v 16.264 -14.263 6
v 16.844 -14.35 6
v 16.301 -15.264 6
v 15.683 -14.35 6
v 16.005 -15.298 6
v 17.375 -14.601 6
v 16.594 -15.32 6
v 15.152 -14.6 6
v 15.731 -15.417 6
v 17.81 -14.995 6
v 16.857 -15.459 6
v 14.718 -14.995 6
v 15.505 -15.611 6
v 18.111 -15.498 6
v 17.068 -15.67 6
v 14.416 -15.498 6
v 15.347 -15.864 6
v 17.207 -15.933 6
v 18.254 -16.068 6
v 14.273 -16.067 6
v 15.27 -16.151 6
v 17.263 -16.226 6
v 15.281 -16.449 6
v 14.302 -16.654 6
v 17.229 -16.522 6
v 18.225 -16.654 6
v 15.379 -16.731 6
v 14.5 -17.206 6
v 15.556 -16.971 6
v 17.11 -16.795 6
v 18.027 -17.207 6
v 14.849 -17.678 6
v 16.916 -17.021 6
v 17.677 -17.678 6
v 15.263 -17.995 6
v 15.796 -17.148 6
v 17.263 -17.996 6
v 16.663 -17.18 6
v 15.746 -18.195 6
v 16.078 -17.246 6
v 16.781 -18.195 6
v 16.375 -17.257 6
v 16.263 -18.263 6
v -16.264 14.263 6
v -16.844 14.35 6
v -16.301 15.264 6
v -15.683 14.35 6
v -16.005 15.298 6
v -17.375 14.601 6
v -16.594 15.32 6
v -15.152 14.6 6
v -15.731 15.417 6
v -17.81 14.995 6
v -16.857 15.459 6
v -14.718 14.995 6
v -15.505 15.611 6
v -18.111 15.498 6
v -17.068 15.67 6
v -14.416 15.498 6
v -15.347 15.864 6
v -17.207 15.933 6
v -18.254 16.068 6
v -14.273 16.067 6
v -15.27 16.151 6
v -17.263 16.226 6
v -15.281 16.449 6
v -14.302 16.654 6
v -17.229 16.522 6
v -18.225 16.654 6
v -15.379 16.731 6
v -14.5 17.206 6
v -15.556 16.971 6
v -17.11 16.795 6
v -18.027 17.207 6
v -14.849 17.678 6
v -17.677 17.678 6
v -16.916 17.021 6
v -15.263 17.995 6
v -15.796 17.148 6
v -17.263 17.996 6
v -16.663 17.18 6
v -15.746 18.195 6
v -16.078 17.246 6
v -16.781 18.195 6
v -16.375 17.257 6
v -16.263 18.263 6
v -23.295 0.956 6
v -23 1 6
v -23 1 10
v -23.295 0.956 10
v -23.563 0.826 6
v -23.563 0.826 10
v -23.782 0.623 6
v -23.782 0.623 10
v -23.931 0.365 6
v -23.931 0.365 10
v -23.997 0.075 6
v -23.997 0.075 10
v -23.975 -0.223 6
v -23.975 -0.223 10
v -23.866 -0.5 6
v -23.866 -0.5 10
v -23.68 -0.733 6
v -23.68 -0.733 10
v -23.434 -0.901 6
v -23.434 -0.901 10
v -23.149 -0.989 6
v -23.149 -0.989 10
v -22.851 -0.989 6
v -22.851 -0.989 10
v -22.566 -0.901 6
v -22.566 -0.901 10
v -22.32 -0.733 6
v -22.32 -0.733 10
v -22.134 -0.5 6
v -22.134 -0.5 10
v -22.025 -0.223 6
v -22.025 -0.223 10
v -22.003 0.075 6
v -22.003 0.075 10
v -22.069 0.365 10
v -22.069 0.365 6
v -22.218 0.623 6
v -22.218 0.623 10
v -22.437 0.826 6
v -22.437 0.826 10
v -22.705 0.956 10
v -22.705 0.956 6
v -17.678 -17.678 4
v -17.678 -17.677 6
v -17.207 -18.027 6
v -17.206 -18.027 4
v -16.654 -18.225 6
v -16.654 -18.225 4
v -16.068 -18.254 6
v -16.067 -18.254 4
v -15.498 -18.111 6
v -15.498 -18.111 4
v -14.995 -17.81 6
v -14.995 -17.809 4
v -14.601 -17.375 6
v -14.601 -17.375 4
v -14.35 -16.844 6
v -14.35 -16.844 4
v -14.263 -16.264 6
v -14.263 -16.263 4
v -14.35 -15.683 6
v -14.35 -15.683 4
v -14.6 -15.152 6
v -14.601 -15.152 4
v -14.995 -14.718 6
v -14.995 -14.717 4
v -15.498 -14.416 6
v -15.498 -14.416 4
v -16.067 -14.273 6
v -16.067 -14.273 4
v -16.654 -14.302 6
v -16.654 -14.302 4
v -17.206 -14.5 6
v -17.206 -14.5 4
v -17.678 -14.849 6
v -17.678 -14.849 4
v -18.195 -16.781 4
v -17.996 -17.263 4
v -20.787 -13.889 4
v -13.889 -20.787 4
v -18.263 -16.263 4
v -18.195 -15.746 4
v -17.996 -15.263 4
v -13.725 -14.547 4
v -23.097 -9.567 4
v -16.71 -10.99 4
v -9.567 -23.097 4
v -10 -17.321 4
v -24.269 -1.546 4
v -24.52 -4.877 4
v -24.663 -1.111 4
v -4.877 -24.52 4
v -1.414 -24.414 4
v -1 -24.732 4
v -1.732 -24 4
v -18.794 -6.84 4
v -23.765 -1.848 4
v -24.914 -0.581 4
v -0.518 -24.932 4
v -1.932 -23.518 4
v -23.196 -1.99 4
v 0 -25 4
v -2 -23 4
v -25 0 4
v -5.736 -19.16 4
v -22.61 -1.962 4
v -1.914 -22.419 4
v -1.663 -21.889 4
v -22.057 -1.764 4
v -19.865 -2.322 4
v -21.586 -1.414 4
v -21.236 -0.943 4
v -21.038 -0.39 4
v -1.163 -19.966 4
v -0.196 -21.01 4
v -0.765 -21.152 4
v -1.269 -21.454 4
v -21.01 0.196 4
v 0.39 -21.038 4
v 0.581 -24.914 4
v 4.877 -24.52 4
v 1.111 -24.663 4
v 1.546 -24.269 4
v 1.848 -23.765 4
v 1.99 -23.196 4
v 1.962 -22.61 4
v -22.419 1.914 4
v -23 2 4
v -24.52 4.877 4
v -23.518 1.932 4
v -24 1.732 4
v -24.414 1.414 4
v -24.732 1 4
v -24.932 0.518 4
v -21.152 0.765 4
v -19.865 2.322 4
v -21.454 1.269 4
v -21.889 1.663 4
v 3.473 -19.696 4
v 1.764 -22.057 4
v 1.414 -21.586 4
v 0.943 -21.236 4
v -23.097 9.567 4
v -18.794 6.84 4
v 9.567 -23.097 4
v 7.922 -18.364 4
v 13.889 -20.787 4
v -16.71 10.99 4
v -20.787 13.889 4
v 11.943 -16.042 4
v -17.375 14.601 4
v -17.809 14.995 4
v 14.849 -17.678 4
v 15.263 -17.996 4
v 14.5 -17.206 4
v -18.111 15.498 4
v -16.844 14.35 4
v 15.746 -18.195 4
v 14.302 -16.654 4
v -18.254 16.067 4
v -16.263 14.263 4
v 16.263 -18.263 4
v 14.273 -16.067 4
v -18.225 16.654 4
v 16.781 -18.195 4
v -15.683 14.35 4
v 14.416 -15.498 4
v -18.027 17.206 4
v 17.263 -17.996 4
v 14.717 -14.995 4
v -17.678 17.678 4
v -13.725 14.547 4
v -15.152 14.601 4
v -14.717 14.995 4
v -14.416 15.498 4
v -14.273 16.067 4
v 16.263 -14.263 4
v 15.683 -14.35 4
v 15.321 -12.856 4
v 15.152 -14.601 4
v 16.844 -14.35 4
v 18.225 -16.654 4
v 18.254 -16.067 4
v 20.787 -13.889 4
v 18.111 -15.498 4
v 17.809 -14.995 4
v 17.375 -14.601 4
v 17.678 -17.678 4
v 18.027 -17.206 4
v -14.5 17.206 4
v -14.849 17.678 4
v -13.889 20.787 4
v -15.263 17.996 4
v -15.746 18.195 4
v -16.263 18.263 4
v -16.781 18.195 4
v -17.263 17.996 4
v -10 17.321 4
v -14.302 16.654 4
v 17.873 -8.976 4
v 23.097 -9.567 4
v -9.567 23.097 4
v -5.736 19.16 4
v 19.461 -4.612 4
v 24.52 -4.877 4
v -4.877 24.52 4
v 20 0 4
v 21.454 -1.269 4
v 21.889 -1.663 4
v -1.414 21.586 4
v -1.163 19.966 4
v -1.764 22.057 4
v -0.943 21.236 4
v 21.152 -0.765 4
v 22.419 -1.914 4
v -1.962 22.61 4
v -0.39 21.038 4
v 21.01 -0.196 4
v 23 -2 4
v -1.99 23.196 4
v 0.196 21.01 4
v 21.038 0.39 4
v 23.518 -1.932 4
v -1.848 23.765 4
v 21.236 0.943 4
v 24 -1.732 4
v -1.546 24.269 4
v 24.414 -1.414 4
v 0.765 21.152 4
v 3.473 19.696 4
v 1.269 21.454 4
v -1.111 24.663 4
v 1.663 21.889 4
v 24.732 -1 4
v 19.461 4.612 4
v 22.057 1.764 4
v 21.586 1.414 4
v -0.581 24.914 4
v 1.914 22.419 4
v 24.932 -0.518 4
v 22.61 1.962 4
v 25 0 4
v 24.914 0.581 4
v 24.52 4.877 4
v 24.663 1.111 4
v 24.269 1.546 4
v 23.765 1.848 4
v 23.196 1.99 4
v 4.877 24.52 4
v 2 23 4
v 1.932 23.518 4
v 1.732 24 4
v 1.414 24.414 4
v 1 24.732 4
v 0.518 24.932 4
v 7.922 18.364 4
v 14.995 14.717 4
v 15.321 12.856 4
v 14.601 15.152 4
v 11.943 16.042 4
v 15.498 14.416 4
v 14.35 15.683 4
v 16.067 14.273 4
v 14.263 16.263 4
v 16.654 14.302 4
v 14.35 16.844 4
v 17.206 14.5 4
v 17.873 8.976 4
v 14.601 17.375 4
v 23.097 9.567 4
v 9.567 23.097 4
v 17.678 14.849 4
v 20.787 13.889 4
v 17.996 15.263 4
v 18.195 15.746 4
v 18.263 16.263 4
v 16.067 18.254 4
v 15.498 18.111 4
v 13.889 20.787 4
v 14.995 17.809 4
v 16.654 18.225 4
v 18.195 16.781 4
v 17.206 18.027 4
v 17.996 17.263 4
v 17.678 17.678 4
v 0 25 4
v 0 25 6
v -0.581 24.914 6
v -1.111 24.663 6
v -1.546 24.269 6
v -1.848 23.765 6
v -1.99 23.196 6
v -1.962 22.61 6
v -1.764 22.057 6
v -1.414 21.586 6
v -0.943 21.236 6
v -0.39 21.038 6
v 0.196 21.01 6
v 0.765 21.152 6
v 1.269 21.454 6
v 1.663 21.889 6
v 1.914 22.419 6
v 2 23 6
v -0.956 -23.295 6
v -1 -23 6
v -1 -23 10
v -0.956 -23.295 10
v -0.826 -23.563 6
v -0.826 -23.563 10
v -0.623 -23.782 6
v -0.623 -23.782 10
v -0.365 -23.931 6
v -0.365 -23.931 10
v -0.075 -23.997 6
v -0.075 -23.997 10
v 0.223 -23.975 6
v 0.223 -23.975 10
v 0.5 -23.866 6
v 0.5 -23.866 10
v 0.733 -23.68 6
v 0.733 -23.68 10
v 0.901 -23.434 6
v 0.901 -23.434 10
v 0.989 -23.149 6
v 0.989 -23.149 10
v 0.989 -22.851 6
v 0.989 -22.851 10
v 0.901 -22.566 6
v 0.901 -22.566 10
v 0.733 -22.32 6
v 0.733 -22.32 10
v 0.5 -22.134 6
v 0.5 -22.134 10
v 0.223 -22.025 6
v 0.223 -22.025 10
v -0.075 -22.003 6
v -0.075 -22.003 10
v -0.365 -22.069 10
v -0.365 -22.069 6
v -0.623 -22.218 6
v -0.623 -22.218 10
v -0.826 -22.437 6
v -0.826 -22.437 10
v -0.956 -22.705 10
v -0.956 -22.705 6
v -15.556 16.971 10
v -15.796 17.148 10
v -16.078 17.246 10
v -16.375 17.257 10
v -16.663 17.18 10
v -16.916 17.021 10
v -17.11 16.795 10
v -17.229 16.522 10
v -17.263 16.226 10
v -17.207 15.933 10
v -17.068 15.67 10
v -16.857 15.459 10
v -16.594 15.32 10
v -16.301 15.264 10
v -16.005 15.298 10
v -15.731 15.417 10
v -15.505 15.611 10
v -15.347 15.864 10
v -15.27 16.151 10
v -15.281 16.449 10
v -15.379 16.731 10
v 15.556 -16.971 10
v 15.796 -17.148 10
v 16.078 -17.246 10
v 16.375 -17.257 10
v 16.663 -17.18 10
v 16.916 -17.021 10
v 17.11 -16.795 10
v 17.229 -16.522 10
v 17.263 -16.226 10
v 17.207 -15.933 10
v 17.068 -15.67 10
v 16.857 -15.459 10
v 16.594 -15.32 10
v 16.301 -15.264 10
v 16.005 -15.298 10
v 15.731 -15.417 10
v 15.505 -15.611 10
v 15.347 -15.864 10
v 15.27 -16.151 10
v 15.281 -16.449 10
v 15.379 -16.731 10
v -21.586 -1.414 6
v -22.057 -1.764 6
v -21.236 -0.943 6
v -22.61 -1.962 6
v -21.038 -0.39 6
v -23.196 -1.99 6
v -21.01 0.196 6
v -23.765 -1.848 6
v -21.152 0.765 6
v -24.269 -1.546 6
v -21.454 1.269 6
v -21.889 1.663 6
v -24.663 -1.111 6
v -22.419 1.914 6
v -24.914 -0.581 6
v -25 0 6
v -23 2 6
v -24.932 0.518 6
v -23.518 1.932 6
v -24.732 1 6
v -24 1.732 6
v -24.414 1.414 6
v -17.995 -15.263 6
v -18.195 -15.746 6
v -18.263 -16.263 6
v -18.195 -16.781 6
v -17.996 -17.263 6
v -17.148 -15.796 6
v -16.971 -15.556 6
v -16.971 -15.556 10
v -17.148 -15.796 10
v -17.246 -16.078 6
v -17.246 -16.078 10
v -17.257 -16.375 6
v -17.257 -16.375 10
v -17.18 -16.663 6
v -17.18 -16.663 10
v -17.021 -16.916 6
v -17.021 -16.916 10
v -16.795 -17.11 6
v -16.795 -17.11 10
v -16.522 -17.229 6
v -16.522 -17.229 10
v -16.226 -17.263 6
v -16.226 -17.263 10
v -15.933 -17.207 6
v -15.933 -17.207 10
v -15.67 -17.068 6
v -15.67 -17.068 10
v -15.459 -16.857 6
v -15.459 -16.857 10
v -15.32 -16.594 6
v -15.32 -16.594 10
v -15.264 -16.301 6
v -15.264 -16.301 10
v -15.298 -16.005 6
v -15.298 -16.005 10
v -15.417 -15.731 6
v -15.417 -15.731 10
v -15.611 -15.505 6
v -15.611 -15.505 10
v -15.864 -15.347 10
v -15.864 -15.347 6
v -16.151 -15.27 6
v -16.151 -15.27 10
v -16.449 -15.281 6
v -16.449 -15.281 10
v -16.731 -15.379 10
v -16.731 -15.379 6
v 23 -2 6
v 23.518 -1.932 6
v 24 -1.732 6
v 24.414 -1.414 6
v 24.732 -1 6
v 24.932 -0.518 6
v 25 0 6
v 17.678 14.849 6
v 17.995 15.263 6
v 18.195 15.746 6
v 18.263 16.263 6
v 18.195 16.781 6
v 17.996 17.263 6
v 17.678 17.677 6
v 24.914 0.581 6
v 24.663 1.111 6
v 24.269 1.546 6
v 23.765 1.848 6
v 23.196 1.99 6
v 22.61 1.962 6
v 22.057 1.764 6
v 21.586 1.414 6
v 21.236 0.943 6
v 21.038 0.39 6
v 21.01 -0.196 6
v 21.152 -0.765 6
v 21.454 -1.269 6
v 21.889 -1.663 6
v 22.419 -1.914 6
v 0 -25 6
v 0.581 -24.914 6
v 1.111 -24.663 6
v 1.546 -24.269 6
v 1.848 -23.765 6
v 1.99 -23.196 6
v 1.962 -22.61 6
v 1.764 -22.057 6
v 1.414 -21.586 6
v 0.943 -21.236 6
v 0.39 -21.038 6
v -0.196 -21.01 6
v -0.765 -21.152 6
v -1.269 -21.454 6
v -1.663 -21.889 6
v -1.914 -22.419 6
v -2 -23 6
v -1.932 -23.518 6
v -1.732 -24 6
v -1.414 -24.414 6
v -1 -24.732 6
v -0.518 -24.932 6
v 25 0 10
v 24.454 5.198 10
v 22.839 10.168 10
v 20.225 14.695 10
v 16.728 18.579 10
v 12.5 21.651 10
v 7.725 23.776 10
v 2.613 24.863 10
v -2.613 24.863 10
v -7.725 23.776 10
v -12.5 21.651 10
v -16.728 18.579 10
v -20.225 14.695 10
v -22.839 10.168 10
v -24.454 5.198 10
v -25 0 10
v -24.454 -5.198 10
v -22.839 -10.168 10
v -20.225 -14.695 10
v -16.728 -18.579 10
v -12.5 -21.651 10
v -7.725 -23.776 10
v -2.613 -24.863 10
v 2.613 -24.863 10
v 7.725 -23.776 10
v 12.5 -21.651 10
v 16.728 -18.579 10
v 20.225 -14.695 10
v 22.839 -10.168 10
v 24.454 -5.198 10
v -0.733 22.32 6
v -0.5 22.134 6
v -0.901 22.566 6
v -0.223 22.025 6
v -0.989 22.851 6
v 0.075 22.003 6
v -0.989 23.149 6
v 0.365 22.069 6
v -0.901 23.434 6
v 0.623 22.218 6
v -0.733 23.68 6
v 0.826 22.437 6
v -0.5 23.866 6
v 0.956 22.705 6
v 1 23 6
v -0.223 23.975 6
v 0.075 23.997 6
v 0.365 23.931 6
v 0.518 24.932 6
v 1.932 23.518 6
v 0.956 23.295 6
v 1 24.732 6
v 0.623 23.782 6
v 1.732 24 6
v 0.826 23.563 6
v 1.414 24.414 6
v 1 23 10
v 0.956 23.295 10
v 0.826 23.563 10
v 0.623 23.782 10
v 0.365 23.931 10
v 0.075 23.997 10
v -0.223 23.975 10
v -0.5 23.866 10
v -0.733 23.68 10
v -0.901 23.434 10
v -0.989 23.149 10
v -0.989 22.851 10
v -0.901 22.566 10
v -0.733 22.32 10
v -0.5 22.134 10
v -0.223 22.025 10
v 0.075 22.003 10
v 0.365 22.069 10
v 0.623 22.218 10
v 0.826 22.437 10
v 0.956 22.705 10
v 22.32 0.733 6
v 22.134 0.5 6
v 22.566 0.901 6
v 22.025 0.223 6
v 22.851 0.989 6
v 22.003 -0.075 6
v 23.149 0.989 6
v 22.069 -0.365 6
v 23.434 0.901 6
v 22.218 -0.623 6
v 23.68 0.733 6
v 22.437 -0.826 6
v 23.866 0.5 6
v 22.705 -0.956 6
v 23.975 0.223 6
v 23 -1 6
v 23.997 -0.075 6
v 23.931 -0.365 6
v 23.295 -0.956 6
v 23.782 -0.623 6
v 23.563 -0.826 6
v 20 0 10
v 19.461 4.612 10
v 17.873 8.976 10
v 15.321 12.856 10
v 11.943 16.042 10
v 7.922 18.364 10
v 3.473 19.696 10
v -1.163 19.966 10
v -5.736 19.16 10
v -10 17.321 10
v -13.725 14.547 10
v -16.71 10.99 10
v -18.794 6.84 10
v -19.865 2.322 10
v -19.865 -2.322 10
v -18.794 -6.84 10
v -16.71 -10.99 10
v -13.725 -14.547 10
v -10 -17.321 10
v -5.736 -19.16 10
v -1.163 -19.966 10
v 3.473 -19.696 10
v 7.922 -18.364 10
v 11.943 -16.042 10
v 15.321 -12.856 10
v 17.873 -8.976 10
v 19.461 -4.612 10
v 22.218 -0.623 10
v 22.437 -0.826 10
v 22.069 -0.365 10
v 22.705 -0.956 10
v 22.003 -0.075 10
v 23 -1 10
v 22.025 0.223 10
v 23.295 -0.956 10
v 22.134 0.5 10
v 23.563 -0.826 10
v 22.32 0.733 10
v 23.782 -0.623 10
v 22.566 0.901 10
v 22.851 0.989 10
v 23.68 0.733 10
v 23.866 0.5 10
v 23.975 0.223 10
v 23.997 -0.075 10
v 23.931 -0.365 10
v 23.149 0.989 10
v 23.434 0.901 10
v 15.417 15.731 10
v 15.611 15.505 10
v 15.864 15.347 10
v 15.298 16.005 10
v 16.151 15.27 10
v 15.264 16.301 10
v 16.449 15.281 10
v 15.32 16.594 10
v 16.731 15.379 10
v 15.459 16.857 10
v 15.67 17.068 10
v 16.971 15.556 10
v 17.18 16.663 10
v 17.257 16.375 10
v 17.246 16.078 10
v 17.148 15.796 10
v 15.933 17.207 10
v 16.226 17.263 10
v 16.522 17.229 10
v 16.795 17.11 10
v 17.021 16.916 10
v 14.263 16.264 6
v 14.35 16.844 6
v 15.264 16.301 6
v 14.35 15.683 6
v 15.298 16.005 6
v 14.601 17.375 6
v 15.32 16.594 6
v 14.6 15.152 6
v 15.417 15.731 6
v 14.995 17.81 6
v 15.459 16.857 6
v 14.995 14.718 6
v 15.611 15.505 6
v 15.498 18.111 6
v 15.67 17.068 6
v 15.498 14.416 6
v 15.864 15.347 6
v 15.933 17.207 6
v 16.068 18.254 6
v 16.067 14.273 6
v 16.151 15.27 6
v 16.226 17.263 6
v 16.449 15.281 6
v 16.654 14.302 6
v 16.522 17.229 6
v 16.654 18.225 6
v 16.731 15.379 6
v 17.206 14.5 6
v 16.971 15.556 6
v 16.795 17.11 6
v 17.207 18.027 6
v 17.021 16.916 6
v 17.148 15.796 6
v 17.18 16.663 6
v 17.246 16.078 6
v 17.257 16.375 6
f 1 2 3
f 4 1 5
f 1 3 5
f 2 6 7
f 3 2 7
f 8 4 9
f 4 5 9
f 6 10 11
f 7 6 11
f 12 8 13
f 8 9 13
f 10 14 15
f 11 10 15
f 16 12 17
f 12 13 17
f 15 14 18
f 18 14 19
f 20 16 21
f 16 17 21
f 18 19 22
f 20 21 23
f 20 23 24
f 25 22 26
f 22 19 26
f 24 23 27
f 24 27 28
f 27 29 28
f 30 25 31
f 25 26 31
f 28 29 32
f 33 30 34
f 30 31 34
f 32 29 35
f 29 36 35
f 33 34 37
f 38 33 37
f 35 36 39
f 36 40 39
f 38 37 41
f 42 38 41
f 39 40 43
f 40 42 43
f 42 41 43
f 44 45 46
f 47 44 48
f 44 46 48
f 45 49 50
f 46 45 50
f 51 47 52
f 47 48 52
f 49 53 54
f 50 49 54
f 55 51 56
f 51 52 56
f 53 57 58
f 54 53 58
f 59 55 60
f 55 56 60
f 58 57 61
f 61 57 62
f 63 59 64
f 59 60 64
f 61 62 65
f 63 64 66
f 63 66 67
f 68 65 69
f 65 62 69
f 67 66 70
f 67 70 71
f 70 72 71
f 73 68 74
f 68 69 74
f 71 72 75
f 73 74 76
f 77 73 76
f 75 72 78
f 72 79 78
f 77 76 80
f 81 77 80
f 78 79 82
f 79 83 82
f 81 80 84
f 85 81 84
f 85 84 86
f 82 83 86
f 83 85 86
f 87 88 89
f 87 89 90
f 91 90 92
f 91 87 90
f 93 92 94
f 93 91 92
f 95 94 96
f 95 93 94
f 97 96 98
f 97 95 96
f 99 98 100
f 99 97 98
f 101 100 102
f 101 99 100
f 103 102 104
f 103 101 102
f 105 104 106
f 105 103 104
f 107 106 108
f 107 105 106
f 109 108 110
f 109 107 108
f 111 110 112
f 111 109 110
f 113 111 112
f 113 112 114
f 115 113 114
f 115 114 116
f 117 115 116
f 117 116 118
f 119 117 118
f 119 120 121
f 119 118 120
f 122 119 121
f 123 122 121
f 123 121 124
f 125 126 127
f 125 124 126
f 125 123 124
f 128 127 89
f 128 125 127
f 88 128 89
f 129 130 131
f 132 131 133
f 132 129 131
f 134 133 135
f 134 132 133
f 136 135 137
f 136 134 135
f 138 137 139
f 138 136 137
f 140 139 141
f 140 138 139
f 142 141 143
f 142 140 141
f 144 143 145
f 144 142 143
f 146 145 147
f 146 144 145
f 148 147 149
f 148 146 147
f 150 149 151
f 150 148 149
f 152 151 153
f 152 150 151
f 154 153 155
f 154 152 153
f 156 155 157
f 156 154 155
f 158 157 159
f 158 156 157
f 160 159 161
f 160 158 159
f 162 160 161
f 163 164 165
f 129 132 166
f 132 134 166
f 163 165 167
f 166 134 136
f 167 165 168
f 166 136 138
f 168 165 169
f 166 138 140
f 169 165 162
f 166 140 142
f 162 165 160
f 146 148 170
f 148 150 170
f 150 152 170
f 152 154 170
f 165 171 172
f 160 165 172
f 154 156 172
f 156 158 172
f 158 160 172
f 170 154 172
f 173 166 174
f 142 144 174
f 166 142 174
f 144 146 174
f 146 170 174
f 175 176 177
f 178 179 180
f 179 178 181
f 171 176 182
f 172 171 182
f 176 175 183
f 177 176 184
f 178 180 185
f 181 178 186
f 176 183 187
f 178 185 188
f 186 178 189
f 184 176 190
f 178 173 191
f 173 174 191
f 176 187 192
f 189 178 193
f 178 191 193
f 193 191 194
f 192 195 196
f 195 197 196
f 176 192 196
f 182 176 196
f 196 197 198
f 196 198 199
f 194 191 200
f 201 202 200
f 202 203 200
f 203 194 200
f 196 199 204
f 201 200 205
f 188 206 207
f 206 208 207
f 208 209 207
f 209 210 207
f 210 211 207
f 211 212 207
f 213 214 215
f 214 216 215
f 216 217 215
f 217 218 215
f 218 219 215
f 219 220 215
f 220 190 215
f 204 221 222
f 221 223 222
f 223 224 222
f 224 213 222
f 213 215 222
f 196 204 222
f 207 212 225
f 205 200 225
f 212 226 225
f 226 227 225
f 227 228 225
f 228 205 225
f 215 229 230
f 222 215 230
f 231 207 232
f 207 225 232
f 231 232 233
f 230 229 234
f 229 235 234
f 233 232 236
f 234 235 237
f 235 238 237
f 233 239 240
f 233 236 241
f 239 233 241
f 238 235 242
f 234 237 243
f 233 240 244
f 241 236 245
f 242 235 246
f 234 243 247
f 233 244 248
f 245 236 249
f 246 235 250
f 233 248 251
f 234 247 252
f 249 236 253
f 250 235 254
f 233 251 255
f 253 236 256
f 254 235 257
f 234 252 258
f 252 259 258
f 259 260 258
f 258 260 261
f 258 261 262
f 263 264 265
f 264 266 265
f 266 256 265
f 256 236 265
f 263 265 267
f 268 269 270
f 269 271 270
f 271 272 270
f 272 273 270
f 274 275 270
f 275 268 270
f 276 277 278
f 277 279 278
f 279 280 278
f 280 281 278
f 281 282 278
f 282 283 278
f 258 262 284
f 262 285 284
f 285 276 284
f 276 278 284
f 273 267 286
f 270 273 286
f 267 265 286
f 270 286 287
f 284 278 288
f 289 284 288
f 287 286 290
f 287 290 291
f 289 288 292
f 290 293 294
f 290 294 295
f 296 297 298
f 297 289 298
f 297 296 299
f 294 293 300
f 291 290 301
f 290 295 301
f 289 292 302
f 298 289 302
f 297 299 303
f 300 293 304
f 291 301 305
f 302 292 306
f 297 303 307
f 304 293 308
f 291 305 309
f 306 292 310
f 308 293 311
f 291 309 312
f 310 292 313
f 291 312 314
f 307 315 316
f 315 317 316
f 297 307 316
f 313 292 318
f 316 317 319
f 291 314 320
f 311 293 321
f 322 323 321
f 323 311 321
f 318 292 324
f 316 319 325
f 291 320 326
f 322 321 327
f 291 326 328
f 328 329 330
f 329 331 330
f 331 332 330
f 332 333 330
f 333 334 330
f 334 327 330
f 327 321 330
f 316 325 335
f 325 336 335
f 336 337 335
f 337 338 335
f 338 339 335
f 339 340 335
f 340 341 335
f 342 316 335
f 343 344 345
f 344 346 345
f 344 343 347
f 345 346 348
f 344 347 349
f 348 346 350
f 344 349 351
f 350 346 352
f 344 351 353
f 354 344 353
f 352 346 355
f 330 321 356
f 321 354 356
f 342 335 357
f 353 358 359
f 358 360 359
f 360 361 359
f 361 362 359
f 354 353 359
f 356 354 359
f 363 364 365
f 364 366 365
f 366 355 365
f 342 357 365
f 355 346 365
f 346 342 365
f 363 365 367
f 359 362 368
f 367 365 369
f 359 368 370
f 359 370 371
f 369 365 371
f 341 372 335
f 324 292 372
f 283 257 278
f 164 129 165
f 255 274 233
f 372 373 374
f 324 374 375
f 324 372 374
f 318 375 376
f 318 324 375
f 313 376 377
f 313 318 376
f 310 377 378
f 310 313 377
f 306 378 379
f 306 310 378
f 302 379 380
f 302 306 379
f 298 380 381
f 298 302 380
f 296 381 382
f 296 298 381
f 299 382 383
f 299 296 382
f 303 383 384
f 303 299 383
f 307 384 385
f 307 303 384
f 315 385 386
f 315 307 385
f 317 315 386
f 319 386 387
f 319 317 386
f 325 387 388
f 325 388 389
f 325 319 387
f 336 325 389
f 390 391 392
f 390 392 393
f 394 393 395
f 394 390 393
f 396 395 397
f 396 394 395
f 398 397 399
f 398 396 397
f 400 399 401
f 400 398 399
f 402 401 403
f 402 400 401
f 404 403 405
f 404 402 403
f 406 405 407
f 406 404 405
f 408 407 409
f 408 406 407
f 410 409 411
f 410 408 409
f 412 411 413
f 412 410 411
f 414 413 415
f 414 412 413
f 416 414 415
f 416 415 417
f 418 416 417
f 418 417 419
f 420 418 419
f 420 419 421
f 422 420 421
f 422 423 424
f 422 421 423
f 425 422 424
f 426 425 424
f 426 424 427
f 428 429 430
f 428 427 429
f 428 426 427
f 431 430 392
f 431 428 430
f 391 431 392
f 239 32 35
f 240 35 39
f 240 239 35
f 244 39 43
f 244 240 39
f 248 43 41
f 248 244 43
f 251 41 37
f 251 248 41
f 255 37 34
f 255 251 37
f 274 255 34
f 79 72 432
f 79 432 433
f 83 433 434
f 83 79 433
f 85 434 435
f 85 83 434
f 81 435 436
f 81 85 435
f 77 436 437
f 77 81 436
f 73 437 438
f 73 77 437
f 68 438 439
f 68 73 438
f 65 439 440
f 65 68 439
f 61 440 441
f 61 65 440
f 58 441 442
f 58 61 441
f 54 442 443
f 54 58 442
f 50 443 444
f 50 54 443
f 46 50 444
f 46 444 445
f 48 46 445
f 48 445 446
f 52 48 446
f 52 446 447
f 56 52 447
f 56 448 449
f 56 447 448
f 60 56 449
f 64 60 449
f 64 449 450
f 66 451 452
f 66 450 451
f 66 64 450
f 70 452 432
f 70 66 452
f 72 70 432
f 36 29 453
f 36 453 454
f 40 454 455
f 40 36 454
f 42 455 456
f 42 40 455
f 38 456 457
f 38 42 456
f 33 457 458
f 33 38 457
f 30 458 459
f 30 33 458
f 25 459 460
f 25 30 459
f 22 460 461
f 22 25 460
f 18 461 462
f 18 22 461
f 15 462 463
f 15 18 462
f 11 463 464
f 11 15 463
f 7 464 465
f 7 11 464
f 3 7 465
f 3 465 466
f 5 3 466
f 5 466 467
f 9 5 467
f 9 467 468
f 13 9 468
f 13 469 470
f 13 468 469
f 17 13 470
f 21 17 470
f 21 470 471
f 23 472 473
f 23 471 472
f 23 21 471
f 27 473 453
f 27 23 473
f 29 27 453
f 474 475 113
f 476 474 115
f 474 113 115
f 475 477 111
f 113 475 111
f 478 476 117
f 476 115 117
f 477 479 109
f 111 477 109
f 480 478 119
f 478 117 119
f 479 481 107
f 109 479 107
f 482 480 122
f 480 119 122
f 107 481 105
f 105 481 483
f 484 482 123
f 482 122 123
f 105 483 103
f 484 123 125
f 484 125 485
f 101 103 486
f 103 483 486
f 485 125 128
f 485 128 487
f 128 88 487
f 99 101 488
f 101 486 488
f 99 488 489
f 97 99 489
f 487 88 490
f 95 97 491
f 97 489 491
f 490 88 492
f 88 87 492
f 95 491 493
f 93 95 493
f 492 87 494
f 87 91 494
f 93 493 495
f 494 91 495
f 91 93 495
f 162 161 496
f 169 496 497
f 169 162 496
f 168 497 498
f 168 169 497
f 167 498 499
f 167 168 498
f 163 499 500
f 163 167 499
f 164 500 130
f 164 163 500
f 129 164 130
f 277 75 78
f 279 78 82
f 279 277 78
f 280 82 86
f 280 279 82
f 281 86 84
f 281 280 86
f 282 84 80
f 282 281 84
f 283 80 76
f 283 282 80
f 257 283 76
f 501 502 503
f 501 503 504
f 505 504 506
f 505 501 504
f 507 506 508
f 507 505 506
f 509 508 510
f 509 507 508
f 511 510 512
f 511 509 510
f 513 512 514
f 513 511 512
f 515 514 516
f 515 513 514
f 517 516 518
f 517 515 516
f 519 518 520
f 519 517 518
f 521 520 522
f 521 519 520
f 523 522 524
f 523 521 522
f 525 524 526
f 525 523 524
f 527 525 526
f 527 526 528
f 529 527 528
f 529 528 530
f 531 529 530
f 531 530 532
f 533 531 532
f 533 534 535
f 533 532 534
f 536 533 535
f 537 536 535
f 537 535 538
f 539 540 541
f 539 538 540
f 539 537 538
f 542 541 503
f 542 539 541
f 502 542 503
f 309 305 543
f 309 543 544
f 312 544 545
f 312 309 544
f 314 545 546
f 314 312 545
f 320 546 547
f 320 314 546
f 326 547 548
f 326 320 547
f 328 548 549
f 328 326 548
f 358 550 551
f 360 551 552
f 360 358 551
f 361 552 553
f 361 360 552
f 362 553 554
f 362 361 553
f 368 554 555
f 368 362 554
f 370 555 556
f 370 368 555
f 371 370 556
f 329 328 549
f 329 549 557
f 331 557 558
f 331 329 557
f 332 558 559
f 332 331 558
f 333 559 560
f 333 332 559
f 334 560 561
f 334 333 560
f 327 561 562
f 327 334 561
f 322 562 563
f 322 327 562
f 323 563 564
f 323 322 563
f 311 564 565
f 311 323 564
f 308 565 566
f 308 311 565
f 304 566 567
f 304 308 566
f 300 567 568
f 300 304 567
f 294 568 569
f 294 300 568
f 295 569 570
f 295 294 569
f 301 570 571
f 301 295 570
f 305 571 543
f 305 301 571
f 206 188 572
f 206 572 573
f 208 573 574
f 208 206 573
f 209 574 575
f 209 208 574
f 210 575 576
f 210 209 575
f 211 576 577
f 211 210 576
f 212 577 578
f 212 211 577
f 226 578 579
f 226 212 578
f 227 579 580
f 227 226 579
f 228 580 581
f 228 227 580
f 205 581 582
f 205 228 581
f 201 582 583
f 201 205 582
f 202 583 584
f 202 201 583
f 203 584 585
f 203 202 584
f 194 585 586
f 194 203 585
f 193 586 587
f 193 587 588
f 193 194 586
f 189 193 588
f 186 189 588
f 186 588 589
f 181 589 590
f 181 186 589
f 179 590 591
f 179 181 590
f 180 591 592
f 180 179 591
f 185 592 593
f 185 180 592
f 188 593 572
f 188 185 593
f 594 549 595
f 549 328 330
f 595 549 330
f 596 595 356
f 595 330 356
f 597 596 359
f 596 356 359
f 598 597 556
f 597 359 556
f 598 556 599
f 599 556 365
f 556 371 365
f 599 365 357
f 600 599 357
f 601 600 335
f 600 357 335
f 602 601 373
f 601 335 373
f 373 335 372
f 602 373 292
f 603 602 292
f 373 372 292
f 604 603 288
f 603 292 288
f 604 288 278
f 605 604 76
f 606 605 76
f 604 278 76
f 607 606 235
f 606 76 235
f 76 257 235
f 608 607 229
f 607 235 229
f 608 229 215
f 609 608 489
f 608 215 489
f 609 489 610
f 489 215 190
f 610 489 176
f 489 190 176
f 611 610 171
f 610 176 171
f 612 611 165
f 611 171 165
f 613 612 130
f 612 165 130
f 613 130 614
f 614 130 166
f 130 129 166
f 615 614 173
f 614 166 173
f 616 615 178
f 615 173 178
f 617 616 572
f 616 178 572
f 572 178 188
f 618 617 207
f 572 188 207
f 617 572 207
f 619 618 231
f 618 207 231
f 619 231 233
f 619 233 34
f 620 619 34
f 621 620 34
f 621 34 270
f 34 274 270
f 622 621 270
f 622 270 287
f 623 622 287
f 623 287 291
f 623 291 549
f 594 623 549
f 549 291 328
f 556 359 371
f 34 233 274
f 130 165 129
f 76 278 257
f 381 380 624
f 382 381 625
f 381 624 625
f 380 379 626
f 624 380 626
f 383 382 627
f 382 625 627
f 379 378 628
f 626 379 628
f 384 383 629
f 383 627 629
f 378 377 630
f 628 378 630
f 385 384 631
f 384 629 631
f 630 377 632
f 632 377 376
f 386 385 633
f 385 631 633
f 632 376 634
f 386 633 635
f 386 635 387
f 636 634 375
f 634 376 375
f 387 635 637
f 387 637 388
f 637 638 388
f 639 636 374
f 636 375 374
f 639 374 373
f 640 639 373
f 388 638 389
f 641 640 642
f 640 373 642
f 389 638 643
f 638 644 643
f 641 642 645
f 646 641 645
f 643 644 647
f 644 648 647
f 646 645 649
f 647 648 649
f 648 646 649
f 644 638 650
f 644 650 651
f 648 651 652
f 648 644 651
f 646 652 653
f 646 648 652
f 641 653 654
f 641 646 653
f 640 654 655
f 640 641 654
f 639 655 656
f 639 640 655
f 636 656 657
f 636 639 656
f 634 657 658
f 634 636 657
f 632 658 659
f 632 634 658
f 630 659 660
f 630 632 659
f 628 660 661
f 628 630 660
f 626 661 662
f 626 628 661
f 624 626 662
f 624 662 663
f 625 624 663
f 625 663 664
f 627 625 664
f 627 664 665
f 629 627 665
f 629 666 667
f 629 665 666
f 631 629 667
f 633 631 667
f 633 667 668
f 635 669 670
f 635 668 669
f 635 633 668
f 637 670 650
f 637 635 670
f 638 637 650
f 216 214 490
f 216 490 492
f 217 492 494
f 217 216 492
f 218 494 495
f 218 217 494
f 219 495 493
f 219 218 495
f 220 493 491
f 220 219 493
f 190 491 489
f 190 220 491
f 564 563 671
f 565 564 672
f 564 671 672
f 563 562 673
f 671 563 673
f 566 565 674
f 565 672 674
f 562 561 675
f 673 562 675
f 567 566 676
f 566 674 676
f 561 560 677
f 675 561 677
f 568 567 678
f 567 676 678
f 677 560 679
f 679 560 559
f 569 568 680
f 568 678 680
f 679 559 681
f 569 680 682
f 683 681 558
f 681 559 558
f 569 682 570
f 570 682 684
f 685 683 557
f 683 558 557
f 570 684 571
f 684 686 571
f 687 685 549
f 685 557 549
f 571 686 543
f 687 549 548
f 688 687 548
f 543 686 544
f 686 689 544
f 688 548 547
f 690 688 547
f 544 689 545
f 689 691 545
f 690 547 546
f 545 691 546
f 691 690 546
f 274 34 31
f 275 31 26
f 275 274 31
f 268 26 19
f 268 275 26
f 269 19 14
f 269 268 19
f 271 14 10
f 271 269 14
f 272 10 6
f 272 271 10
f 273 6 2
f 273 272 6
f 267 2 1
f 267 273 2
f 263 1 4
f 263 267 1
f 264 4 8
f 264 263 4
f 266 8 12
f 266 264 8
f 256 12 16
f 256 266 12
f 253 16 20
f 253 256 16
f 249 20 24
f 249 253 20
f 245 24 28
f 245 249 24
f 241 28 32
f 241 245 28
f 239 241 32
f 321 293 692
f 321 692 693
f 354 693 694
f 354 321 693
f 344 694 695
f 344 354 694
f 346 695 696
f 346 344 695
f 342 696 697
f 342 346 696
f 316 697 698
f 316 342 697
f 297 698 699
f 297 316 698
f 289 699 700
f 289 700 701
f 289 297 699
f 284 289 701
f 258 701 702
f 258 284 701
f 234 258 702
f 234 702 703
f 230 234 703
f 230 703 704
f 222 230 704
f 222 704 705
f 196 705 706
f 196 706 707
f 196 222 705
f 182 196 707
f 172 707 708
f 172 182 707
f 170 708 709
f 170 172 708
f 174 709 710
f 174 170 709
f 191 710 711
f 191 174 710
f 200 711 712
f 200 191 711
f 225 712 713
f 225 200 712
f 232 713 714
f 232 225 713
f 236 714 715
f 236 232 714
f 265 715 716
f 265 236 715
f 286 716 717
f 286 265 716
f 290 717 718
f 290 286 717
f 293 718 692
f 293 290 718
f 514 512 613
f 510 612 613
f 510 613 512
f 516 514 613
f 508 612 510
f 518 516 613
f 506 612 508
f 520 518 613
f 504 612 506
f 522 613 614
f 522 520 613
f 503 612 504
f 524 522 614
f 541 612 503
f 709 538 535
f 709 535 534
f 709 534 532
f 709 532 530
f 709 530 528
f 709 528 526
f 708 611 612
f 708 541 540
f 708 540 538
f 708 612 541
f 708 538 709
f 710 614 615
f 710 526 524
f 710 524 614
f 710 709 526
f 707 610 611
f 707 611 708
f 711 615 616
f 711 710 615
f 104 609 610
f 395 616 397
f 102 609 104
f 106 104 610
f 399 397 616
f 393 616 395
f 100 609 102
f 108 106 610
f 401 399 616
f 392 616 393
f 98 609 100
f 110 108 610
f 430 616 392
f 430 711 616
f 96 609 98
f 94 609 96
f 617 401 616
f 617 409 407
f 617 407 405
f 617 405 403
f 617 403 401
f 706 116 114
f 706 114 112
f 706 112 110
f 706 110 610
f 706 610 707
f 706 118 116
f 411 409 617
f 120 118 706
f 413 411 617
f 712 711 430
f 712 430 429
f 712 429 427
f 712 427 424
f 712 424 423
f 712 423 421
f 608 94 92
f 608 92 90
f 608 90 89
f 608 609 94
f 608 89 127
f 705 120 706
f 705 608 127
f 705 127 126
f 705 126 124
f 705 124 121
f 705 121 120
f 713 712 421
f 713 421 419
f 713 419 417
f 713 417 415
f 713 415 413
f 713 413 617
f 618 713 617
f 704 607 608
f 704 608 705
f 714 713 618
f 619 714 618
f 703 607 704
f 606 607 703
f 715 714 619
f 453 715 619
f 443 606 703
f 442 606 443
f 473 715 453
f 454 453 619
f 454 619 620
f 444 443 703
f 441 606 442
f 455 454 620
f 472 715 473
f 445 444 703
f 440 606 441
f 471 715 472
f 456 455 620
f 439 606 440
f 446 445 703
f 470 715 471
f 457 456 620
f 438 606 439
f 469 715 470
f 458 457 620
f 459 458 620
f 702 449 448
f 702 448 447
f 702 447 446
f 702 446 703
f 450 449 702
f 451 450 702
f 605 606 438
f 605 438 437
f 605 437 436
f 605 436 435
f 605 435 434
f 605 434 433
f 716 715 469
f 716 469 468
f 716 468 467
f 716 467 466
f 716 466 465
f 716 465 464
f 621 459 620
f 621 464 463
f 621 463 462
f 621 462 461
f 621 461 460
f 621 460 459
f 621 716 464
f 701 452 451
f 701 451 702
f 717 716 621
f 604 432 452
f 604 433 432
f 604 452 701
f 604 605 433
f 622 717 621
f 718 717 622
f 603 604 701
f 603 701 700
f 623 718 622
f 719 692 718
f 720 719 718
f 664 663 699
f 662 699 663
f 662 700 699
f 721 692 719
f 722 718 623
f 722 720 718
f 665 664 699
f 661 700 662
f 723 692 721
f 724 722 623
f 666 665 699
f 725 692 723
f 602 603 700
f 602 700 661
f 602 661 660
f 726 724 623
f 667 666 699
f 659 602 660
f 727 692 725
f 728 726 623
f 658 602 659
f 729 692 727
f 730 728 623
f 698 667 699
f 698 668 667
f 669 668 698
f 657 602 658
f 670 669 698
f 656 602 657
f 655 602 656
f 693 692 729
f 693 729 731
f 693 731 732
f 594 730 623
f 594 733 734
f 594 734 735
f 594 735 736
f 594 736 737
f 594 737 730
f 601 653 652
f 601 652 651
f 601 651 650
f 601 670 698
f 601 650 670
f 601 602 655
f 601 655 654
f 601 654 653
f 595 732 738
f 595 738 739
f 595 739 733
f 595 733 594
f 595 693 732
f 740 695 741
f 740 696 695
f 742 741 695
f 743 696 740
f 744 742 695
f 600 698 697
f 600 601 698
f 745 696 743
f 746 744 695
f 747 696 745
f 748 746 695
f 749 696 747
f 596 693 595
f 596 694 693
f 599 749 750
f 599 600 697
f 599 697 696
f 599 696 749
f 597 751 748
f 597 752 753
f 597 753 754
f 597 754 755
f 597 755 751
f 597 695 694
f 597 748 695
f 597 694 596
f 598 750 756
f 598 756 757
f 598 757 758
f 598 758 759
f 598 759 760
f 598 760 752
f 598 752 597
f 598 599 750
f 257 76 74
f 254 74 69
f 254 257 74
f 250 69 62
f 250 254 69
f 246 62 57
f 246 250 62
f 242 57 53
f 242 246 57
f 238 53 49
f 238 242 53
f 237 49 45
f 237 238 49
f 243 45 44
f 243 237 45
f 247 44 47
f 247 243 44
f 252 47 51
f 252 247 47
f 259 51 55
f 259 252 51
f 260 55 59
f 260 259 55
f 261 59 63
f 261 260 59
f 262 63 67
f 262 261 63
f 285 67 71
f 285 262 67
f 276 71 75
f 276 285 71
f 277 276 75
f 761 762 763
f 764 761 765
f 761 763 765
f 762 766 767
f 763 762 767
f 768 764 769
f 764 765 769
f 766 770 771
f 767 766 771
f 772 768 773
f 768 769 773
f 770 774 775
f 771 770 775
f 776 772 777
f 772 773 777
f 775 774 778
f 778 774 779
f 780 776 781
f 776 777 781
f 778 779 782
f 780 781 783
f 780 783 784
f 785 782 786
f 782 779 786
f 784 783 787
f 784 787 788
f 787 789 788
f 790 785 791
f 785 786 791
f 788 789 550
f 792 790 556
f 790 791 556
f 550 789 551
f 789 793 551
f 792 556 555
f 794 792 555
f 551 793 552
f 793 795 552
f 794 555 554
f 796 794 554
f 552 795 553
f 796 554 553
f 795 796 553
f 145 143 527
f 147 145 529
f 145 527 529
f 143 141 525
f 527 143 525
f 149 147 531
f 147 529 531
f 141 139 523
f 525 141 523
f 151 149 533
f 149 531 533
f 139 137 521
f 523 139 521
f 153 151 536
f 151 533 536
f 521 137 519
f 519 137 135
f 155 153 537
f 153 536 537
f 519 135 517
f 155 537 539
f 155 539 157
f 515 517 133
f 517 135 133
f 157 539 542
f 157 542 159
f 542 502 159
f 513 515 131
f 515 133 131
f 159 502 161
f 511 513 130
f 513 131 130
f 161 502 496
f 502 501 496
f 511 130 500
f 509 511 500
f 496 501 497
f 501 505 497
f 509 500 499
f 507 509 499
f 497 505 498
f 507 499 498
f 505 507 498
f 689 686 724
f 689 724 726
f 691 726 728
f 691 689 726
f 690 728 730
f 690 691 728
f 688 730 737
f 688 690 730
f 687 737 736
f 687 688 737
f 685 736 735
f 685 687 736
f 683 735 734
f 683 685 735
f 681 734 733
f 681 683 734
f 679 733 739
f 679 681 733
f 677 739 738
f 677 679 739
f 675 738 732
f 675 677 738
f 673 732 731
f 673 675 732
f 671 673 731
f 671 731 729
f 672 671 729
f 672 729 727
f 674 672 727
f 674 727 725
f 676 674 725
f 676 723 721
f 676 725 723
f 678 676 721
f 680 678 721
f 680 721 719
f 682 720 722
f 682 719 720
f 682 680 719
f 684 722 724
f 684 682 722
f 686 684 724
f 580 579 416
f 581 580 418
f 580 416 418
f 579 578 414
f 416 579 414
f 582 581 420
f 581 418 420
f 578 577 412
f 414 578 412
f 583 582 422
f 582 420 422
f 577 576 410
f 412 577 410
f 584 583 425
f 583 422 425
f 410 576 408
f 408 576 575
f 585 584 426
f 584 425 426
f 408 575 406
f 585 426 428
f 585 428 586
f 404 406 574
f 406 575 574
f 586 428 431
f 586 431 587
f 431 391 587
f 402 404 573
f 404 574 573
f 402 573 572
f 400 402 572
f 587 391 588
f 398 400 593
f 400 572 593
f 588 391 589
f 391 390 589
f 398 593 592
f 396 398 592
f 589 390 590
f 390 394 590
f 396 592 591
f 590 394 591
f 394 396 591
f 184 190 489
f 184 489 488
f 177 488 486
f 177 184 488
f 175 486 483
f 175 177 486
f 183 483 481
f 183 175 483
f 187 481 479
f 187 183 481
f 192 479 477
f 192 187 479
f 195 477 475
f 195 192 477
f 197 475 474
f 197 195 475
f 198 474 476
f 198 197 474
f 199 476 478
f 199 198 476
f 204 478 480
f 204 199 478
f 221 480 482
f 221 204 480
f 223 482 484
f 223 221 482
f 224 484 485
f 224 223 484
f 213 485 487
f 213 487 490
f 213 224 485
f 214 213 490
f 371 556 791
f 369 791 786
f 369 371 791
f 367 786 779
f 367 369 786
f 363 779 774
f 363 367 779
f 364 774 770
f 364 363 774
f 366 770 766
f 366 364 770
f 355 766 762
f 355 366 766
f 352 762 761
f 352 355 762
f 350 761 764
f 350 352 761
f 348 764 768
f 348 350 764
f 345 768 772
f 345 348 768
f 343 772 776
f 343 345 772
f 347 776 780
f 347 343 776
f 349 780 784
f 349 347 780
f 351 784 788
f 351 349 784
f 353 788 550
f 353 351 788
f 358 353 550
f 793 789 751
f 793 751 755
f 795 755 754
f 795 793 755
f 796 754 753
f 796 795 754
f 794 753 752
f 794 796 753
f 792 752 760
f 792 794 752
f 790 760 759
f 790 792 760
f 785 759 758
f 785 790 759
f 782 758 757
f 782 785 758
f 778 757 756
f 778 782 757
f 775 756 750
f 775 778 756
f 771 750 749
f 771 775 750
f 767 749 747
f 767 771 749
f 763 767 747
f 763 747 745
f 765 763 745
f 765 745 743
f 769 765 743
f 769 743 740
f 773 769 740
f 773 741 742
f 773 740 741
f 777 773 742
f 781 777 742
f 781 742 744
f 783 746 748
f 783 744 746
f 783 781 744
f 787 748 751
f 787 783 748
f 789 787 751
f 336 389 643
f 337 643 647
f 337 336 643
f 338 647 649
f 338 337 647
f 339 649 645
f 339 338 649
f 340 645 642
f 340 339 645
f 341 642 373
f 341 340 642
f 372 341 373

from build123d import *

# Parameters (mm, degrees)
CYLINDER2777_R               = 1
CYLINDER2777_DEPTH           = 10
CYLINDER2777_PLACEMENT_ANGLE = 45
CYLINDER2779_R               = 1
CYLINDER2779_DEPTH           = 10
CYLINDER2780_R               = 1
CYLINDER2780_DEPTH           = 10
CYLINDER2780_PLACEMENT_ANGLE = 135
CYLINDER2784_R               = 1
CYLINDER2784_DEPTH           = 10
CYLINDER2776_R               = 1
CYLINDER2776_DEPTH           = 10
CYLINDER2776_PLACEMENT_ANGLE = 225
CYLINDER2782_R               = 1
CYLINDER2782_DEPTH           = 10
CYLINDER2775_R               = 1
CYLINDER2775_DEPTH           = 10
CYLINDER2775_PLACEMENT_ANGLE = 45
CYLINDER2774_R               = 1
CYLINDER2774_DEPTH           = 10
CYLINDER2788_R               = 2
CYLINDER2788_DEPTH           = 2
CYLINDER2788_PLACEMENT_ANGLE = 45
CYLINDER2783_R               = 2
CYLINDER2783_DEPTH           = 2
CYLINDER2778_R               = 2
CYLINDER2778_DEPTH           = 2
CYLINDER2778_PLACEMENT_ANGLE = 135
CYLINDER2789_R               = 2
CYLINDER2789_DEPTH           = 2
CYLINDER2785_R               = 2
CYLINDER2785_DEPTH           = 2
CYLINDER2785_PLACEMENT_ANGLE = 225
CYLINDER2786_R               = 2
CYLINDER2786_DEPTH           = 2
CYLINDER2787_R               = 2
CYLINDER2787_DEPTH           = 2
CYLINDER2787_PLACEMENT_ANGLE = 45
CYLINDER2781_R               = 2
CYLINDER2781_DEPTH           = 2
TUBE136_R                    = 25
TUBE136_R_2                  = 20
TUBE136_DEPTH                = 6


with BuildPart() as v_lec2747:
    # Cylinder2777 → Cylinder2777 (new body)
    with BuildSketch(Plane.XY):
        Circle(CYLINDER2777_R)
    extrude(amount=CYLINDER2777_DEPTH)


with BuildPart() as v_lec2747_1:
    # Cylinder2777 placement: moved
    add(v_lec2747.part.moved(Location((-16.263456, 16.263456, 4))).rotate(Axis((-16.263456, 16.263456, 4), (0, 0, 1)), CYLINDER2777_PLACEMENT_ANGLE))


with BuildPart() as v_lec2749:
    # Cylinder2779 → Cylinder2779 (new body)
    with BuildSketch(Plane(origin=(-23, 0, 4), x_dir=(0, 1, 0), z_dir=(0, 0, 1))):
        Circle(CYLINDER2779_R)
    extrude(amount=CYLINDER2779_DEPTH)


with BuildPart() as v_lec2750:
    # Cylinder2780 → Cylinder2780 (new body)
    with BuildSketch(Plane.XY):
        Circle(CYLINDER2780_R)
    extrude(amount=CYLINDER2780_DEPTH)


with BuildPart() as v_lec2750_1:
    # Cylinder2780 placement: moved
    add(v_lec2750.part.moved(Location((-16.263456, -16.263456, 4))).rotate(Axis((-16.263456, -16.263456, 4), (0, 0, 1)), CYLINDER2780_PLACEMENT_ANGLE))


with BuildPart() as v_lec2754:
    # Cylinder2784 → Cylinder2784 (new body)
    with BuildSketch(Plane(origin=(0, -23, 4), x_dir=(-1, 0, 0), z_dir=(0, 0, 1))):
        Circle(CYLINDER2784_R)
    extrude(amount=CYLINDER2784_DEPTH)


with BuildPart() as v_lec2746:
    # Cylinder2776 → Cylinder2776 (new body)
    with BuildSketch(Plane.XY):
        Circle(CYLINDER2776_R)
    extrude(amount=CYLINDER2776_DEPTH)


with BuildPart() as v_lec2746_1:
    # Cylinder2776 placement: moved
    add(v_lec2746.part.moved(Location((16.263456, -16.263456, 4))).rotate(Axis((16.263456, -16.263456, 4), (0, 0, 1)), CYLINDER2776_PLACEMENT_ANGLE))


with BuildPart() as v_lec2752:
    # Cylinder2782 → Cylinder2782 (new body)
    with BuildSketch(Plane(origin=(23, 0, 4), x_dir=(0, -1, 0), z_dir=(0, 0, 1))):
        Circle(CYLINDER2782_R)
    extrude(amount=CYLINDER2782_DEPTH)


with BuildPart() as v_lec2745:
    # Cylinder2775 → Cylinder2775 (new body)
    with BuildSketch(Plane.XY):
        Circle(CYLINDER2775_R)
    extrude(amount=CYLINDER2775_DEPTH)


with BuildPart() as v_lec2745_1:
    # Cylinder2775 placement: moved
    add(v_lec2745.part.moved(Location((16.263456, 16.263456, 4))).rotate(Axis((16.263456, 16.263456, 4), (0, 0, -1)), CYLINDER2775_PLACEMENT_ANGLE))


with BuildPart() as compound1238:
    # Cylinder2774 → Cylinder2774 (new body)
    with BuildSketch(Plane(origin=(0, 23, 4), x_dir=(1, 0, 0), z_dir=(0, 0, 1))):
        Circle(CYLINDER2774_R)
    extrude(amount=CYLINDER2774_DEPTH)

    # Compound1238: union Válec2747, Válec2749, Válec2750, Válec2754, Válec2746, Válec2752, Válec2745
    add(v_lec2747_1.part)
    add(v_lec2749.part)
    add(v_lec2750_1.part)
    add(v_lec2754.part)
    add(v_lec2746_1.part)
    add(v_lec2752.part)
    add(v_lec2745_1.part)


with BuildPart() as v_lec2758:
    # Cylinder2788 → Cylinder2788 (new body)
    with BuildSketch(Plane.XY):
        Circle(CYLINDER2788_R)
    extrude(amount=CYLINDER2788_DEPTH)


with BuildPart() as v_lec2758_1:
    # Cylinder2788 placement: moved
    add(v_lec2758.part.moved(Location((-16.263456, 16.263456, 4))).rotate(Axis((-16.263456, 16.263456, 4), (0, 0, 1)), CYLINDER2788_PLACEMENT_ANGLE))


with BuildPart() as v_lec2753:
    # Cylinder2783 → Cylinder2783 (new body)
    with BuildSketch(Plane(origin=(-23, 0, 4), x_dir=(0, 1, 0), z_dir=(0, 0, 1))):
        Circle(CYLINDER2783_R)
    extrude(amount=CYLINDER2783_DEPTH)


with BuildPart() as v_lec2748:
    # Cylinder2778 → Cylinder2778 (new body)
    with BuildSketch(Plane.XY):
        Circle(CYLINDER2778_R)
    extrude(amount=CYLINDER2778_DEPTH)


with BuildPart() as v_lec2748_1:
    # Cylinder2778 placement: moved
    add(v_lec2748.part.moved(Location((-16.263456, -16.263456, 4))).rotate(Axis((-16.263456, -16.263456, 4), (0, 0, 1)), CYLINDER2778_PLACEMENT_ANGLE))


with BuildPart() as v_lec2759:
    # Cylinder2789 → Cylinder2789 (new body)
    with BuildSketch(Plane(origin=(0, -23, 4), x_dir=(-1, 0, 0), z_dir=(0, 0, 1))):
        Circle(CYLINDER2789_R)
    extrude(amount=CYLINDER2789_DEPTH)


with BuildPart() as v_lec2755:
    # Cylinder2785 → Cylinder2785 (new body)
    with BuildSketch(Plane.XY):
        Circle(CYLINDER2785_R)
    extrude(amount=CYLINDER2785_DEPTH)


with BuildPart() as v_lec2755_1:
    # Cylinder2785 placement: moved
    add(v_lec2755.part.moved(Location((16.263456, -16.263456, 4))).rotate(Axis((16.263456, -16.263456, 4), (0, 0, 1)), CYLINDER2785_PLACEMENT_ANGLE))


with BuildPart() as v_lec2756:
    # Cylinder2786 → Cylinder2786 (new body)
    with BuildSketch(Plane(origin=(23, 0, 4), x_dir=(0, -1, 0), z_dir=(0, 0, 1))):
        Circle(CYLINDER2786_R)
    extrude(amount=CYLINDER2786_DEPTH)


with BuildPart() as v_lec2757:
    # Cylinder2787 → Cylinder2787 (new body)
    with BuildSketch(Plane.XY):
        Circle(CYLINDER2787_R)
    extrude(amount=CYLINDER2787_DEPTH)


with BuildPart() as v_lec2757_1:
    # Cylinder2787 placement: moved
    add(v_lec2757.part.moved(Location((16.263456, 16.263456, 4))).rotate(Axis((16.263456, 16.263456, 4), (0, 0, -1)), CYLINDER2787_PLACEMENT_ANGLE))


with BuildPart() as compound1239:
    # Cylinder2781 → Cylinder2781 (new body)
    with BuildSketch(Plane(origin=(0, 23, 4), x_dir=(1, 0, 0), z_dir=(0, 0, 1))):
        Circle(CYLINDER2781_R)
    extrude(amount=CYLINDER2781_DEPTH)

    # Compound1239: union Válec2758, Válec2753, Válec2748, Válec2759, Válec2755, Válec2756, Válec2757
    add(v_lec2758_1.part)
    add(v_lec2753.part)
    add(v_lec2748_1.part)
    add(v_lec2759.part)
    add(v_lec2755_1.part)
    add(v_lec2756.part)
    add(v_lec2757_1.part)


with BuildPart() as cut1046:
    # Tube136 → Tube136 (new body)
    with BuildSketch(Plane.XY.offset(4)):
        Circle(TUBE136_R)
        Circle(TUBE136_R_2, mode=Mode.SUBTRACT)
    extrude(amount=TUBE136_DEPTH)

    # Cut1047: cut Compound1239
    add(compound1239.part, mode=Mode.SUBTRACT)

    # Cut1046: cut Compound1238
    add(compound1238.part, mode=Mode.SUBTRACT)


solid = cut1046.part
